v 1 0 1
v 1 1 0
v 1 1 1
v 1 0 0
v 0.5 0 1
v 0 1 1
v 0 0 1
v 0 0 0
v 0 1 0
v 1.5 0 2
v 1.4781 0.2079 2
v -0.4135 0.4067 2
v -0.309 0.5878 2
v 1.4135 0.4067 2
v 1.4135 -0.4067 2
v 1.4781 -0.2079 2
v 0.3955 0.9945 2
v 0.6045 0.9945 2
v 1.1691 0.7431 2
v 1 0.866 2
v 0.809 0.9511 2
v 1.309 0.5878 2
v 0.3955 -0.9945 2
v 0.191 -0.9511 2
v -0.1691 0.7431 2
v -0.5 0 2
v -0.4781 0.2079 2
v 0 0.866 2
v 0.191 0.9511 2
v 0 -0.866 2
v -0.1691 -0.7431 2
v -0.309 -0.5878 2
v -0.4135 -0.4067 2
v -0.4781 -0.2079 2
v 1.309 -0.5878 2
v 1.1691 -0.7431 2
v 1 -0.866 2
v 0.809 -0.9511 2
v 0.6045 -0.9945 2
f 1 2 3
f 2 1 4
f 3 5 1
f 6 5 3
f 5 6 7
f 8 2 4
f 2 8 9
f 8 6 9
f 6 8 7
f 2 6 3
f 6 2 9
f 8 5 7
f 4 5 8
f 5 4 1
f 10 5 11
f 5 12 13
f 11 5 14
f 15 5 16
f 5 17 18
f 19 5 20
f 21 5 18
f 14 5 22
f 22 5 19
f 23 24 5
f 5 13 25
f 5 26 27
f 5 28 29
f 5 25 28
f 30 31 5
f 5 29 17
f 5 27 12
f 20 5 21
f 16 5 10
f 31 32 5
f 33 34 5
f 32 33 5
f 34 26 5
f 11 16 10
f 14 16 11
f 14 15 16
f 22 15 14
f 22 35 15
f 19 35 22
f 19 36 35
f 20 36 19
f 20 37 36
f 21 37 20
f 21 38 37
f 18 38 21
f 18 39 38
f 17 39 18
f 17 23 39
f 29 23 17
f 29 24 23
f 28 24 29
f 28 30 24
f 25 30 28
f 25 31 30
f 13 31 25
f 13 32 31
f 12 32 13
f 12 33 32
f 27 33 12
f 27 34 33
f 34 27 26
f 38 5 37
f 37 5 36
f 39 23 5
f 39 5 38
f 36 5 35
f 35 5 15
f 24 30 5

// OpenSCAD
// Note: to see intersection vertex with compute_CSG,
// use simplify=false 
union() {
   cube();
   translate([0.5,0,1]) cylinder(r1=0,r2=1,$fn=30);
}
